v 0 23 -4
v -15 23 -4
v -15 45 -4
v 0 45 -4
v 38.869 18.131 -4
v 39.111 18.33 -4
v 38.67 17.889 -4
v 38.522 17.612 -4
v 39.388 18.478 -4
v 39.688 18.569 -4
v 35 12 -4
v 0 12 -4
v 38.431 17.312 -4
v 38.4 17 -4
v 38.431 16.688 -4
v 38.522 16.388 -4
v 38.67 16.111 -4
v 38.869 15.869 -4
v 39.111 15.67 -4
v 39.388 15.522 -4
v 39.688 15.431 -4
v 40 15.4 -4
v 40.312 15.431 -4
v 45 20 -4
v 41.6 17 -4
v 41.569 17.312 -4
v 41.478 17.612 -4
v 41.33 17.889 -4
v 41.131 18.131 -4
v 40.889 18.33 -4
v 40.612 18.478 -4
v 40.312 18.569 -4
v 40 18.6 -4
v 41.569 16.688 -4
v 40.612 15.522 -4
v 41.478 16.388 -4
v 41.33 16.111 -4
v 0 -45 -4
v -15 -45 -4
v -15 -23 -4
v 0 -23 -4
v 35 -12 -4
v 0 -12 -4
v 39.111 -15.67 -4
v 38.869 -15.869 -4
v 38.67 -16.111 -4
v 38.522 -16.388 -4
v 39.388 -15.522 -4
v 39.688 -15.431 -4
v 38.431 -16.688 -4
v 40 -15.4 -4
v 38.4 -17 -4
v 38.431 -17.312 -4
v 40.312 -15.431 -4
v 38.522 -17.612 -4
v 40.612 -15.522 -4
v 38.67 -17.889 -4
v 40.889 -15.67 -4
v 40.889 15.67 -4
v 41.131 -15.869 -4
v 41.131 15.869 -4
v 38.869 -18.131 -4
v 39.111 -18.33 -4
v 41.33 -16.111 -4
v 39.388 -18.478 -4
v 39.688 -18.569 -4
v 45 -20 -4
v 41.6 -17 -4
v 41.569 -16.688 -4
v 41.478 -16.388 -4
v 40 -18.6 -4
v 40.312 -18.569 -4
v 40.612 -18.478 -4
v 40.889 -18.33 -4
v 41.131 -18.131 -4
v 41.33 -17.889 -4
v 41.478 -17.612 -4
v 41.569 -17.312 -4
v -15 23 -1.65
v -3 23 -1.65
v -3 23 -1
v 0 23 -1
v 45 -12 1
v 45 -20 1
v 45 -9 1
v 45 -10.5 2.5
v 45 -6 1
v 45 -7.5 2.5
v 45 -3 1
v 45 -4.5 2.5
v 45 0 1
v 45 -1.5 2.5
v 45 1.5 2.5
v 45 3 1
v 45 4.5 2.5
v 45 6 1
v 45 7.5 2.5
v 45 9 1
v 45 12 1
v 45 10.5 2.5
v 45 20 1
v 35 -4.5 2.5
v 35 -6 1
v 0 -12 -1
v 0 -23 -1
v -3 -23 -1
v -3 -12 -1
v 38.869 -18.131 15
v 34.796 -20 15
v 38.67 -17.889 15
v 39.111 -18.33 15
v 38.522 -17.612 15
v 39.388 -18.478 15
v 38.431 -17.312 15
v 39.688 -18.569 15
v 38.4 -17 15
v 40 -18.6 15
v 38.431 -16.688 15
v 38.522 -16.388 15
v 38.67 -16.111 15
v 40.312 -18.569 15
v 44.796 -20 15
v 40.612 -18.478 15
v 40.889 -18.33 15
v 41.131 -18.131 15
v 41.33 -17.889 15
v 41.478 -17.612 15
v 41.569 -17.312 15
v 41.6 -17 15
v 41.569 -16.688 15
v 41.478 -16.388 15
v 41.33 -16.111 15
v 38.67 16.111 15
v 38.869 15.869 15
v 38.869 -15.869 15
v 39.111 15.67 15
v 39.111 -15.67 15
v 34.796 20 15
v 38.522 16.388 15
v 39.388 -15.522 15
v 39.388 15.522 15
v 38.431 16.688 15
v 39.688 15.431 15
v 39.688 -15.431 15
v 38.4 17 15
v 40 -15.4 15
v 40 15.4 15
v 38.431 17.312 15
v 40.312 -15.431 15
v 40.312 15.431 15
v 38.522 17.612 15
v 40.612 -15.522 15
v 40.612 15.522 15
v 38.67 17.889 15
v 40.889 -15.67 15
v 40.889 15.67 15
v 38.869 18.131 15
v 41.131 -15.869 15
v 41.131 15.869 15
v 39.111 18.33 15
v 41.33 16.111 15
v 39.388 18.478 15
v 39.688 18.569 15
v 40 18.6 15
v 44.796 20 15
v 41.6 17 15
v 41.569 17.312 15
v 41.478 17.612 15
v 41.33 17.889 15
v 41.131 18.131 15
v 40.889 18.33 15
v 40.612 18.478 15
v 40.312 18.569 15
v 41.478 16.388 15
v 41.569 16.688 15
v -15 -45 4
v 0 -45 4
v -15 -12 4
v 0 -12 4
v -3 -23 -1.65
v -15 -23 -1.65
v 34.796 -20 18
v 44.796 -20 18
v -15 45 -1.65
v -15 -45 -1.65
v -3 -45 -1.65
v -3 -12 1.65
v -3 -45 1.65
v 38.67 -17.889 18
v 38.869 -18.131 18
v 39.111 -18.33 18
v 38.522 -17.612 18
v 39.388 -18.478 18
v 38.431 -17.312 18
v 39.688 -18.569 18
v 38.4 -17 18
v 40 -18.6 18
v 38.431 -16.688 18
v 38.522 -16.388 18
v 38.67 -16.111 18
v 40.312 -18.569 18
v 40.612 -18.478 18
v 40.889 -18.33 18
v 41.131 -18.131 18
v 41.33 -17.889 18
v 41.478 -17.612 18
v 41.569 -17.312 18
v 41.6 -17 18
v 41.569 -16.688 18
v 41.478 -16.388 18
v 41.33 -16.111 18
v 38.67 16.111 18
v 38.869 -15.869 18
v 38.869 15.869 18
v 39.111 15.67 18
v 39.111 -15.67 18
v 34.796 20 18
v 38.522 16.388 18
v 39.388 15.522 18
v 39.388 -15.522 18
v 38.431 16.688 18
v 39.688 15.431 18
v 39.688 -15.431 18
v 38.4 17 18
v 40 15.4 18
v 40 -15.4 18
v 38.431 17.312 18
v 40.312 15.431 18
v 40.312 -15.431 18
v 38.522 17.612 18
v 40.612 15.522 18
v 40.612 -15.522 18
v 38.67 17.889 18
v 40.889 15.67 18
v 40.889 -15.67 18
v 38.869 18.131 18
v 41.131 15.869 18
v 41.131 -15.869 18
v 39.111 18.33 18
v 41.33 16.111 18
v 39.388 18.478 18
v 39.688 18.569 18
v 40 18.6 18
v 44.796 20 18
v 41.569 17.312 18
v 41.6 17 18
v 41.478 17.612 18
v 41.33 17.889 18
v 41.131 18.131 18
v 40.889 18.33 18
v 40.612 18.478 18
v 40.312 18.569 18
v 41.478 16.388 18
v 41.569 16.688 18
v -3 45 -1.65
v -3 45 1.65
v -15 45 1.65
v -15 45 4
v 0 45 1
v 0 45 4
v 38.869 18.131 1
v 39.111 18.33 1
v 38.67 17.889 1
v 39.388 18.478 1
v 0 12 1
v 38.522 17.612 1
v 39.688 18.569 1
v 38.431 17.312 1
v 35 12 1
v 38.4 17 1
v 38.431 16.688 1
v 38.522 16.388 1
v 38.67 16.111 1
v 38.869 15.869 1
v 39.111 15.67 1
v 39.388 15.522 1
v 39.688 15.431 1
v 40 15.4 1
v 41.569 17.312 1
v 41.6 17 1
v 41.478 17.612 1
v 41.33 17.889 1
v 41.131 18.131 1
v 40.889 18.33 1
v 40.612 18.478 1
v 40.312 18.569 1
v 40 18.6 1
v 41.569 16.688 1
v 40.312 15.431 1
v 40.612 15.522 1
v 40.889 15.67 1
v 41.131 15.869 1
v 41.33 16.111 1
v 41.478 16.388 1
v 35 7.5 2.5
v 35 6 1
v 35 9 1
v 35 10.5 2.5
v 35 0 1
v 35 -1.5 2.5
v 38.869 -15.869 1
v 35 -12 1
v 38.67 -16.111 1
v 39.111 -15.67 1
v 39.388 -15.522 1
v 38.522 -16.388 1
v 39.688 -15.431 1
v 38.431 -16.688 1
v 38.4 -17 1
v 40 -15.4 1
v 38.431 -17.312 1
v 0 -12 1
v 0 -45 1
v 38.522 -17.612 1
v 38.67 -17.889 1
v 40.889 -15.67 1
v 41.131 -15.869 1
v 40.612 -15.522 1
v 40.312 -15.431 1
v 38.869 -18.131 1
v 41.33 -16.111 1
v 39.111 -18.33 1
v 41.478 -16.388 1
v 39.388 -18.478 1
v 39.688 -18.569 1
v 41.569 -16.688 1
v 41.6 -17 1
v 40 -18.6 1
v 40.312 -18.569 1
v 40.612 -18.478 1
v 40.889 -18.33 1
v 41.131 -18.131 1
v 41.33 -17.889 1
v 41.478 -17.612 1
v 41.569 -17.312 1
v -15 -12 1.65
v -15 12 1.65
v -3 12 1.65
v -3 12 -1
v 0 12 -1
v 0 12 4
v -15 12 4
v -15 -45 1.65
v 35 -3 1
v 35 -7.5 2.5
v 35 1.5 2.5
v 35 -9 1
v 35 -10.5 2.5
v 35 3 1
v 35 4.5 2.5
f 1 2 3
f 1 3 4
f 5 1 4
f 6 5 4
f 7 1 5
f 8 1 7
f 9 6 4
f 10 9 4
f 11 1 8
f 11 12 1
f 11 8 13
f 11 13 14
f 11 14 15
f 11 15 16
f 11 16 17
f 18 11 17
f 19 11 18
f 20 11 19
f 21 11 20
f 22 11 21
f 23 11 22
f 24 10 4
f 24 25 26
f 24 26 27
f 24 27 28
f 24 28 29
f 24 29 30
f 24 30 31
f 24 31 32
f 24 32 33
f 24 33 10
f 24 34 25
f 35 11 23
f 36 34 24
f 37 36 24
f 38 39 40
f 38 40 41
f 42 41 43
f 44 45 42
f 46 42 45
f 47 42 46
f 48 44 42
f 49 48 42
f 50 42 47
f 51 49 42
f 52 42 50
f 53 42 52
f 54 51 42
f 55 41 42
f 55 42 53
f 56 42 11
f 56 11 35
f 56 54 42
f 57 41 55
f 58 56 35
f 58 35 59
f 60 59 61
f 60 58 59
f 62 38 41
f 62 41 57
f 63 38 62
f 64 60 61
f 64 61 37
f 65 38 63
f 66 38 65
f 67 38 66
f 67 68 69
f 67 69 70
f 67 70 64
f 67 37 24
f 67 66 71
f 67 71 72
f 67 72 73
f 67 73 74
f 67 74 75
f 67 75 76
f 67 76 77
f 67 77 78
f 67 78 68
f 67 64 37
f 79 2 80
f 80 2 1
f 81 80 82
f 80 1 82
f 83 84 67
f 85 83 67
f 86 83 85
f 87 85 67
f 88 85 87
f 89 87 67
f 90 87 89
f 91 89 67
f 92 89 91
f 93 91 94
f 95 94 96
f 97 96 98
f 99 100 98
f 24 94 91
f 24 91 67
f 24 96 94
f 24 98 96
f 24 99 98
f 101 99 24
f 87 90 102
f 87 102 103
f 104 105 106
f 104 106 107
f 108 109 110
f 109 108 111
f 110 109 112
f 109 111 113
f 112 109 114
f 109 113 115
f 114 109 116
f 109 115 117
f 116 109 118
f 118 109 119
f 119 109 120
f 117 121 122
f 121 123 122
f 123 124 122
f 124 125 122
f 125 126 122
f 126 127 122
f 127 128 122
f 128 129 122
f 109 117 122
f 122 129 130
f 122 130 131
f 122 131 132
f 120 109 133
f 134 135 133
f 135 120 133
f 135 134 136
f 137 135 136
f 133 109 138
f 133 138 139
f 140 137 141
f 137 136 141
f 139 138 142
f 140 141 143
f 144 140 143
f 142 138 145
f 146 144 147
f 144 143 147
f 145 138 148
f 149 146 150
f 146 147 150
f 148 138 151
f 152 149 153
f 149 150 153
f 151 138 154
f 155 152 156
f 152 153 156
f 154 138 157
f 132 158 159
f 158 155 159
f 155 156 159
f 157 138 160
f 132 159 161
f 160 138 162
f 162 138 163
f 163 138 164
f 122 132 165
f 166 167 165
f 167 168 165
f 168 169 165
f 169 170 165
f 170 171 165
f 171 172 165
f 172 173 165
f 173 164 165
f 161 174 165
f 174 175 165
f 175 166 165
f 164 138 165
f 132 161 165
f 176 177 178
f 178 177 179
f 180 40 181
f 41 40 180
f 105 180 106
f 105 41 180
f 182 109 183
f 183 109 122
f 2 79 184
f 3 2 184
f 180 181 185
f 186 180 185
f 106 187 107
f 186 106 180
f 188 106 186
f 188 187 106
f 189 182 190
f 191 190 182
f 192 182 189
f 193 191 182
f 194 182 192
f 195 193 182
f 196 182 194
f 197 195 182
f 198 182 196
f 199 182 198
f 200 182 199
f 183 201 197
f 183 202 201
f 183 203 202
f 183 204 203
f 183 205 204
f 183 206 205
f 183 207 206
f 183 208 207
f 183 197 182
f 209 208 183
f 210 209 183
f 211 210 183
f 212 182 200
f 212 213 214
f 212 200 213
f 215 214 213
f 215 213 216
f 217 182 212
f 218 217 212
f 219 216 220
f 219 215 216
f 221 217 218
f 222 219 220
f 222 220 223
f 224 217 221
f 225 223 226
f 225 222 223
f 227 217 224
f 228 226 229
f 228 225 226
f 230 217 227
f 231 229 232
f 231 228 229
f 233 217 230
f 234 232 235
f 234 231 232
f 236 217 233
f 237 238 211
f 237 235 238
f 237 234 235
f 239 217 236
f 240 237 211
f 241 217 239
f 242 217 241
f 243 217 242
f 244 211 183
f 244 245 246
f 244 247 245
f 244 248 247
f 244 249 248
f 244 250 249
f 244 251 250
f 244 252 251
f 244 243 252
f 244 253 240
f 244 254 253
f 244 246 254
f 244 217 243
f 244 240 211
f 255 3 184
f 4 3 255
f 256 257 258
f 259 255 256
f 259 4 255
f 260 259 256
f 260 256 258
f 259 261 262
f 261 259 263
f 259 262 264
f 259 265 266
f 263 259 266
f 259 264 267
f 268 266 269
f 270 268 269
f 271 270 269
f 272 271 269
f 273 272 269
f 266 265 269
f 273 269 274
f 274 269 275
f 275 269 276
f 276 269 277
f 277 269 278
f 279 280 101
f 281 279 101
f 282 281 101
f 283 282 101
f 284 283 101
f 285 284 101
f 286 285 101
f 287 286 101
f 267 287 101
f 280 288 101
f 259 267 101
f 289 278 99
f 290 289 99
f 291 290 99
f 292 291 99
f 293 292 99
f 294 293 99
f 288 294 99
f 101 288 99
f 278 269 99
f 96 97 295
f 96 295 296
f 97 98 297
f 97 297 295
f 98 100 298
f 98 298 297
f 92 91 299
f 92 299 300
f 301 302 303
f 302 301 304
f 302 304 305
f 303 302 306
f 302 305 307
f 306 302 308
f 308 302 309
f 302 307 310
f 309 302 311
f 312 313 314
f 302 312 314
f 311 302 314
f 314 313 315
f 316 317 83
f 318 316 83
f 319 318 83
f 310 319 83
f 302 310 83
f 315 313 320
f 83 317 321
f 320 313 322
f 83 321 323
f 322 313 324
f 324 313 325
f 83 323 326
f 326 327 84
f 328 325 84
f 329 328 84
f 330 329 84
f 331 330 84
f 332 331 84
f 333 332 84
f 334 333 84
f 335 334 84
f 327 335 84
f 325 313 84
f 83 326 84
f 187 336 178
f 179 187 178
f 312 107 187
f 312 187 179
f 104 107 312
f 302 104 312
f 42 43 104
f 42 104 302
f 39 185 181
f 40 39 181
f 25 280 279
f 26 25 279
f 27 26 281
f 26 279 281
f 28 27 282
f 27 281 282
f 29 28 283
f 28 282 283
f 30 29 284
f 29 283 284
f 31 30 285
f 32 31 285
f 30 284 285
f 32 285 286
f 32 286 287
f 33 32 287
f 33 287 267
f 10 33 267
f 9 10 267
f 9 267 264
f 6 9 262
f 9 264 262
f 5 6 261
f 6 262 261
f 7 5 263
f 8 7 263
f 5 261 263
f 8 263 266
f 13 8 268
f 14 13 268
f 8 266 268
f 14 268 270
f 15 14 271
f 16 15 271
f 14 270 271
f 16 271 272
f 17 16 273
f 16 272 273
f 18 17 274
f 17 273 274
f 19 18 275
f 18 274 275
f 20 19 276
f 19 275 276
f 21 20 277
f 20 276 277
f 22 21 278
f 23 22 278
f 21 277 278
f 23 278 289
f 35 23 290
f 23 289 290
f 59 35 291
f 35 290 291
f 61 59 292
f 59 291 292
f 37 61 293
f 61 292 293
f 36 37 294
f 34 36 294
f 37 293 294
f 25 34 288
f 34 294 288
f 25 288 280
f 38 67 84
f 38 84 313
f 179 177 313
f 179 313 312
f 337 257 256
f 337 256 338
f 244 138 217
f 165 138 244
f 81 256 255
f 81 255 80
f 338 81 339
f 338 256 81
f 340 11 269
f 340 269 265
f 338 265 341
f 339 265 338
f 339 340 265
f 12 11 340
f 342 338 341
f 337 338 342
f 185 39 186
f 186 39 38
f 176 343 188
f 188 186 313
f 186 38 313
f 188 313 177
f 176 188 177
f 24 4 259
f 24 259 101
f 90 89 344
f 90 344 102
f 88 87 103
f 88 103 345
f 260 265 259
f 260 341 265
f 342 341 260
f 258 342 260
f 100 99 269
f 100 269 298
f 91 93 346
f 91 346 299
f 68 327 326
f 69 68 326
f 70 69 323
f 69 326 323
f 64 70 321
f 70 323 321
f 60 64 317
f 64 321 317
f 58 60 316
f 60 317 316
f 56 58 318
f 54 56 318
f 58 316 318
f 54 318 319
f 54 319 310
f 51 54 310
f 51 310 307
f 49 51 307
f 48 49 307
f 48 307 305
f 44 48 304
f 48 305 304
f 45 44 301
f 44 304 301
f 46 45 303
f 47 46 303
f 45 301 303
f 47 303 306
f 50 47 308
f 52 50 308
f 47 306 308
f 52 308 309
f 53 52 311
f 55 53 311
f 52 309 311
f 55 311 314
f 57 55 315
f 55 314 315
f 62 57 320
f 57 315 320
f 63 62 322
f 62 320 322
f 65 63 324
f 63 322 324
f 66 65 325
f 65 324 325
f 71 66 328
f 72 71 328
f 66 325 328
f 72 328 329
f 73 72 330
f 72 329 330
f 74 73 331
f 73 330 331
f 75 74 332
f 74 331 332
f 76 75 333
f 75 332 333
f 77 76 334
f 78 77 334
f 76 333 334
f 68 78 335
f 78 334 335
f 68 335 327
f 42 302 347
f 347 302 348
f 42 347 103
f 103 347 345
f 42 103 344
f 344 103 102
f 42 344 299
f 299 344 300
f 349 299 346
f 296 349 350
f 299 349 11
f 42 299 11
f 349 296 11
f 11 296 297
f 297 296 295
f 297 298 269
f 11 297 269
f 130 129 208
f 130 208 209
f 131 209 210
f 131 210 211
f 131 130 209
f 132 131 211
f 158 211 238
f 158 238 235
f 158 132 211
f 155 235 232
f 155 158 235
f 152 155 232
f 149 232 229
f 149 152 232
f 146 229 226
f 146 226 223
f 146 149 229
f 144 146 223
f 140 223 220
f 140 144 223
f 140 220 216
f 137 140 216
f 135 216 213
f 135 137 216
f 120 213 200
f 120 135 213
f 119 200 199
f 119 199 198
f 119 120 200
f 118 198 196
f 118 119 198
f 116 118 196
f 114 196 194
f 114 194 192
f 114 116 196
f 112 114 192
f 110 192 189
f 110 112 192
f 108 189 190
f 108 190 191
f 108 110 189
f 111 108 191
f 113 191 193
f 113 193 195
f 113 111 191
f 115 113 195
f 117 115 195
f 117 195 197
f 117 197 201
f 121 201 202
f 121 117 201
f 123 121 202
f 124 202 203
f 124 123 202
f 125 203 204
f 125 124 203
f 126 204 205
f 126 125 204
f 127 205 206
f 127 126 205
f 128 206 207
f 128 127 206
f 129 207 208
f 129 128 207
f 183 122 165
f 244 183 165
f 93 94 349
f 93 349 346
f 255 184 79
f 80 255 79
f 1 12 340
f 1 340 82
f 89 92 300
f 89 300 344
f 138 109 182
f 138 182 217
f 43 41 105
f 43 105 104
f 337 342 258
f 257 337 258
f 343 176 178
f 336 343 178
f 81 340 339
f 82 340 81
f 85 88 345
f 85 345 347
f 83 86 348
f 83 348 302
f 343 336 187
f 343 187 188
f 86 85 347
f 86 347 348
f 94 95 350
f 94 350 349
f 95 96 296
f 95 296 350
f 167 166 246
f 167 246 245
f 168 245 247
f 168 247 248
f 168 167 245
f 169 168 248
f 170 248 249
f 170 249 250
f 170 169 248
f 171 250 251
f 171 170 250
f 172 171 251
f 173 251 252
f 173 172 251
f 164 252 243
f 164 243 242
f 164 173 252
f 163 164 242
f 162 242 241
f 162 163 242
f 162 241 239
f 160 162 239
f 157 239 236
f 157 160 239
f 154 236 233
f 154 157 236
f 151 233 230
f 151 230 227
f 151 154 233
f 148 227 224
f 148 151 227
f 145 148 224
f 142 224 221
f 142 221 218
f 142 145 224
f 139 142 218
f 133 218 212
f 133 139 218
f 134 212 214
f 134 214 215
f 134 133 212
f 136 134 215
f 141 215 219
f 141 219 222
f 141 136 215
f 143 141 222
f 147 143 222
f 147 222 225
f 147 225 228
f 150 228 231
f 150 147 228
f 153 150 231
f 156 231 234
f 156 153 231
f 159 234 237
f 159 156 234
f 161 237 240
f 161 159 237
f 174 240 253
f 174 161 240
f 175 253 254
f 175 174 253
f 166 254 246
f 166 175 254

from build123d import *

# Parameters (mm, degrees)
F0_W      = 90
F0_H      = 8
F1_DEPTH  = 15
F2_W      = 90
F2_H      = 3.3
F3_DEPTH  = 12
F4_W      = 24
F4_H      = 5
F5_DEPTH  = 15
F6_W      = 46
F6_H      = 3
F7_DEPTH  = 18
F8_W      = 24
F8_H      = 6
F9_DEPTH  = 15
F11_DEPTH = 5
F12_R     = 1.6
F13_DEPTH = 5
F15_DEPTH = 10
F17_W     = 10
F17_H     = 40
F17_R     = 1.6
F18_DEPTH = 3


with BuildPart() as f1:
    # F0 (on Right) → F1 (new body)
    with BuildSketch(Plane.YZ):
        Rectangle(F0_W, F0_H)
    extrude(amount=-F1_DEPTH)

    # F2 (on face) → F3 (cut)
    with BuildSketch(Plane(origin=(-15, 0, 0), x_dir=(0, -1, 0), z_dir=(-1, 0, 0))):
        Rectangle(F2_W, F2_H)
    extrude(amount=-F3_DEPTH, mode=Mode.SUBTRACT)

    # F4 (on face) → F5 (cut)
    with BuildSketch(Plane.YZ):
        with Locations((0, 1.5)):
            Rectangle(F4_W, F4_H)
    extrude(amount=-F5_DEPTH, mode=Mode.SUBTRACT)

    # F6 (on face) → F7 (cut)
    with BuildSketch(Plane.YZ):
        with Locations((0, -2.5)):
            Rectangle(F6_W, F6_H)
    extrude(amount=-F7_DEPTH, mode=Mode.SUBTRACT)

    # F8 (on face) → F9 (cut)
    with BuildSketch(Plane.YZ):
        with Locations((0, -1)):
            Rectangle(F8_W, F8_H)
    extrude(amount=-F9_DEPTH, mode=Mode.SUBTRACT)

    # F10 (on face) → F11 (join)
    with BuildSketch(Plane(origin=(0, 0, -4), x_dir=(1, 0, 0), z_dir=(0, 0, -1))):
        Polygon((45, 20), (0, 45), (0, 12), (35, 12), (35, 0), (45, 0), align=None)
        Polygon((45, -20), (45, 0), (35, 0), (35, -12), (0, -12), (0, -45), align=None)
    extrude(amount=-F11_DEPTH)

    # F12 (on face) → F13 (cut)
    with BuildSketch(Plane.XY.offset(1)):
        with Locations((40, 17)):
            Circle(F12_R)
        with Locations((40, -17)):
            Circle(F12_R)
    extrude(amount=-F13_DEPTH, mode=Mode.SUBTRACT)

    # F14 (on face) → F15 (join)
    with BuildSketch(Plane.YZ.offset(45)):
        Polygon((10.5, 2.5), (9, 1), (12, 1), align=None)
        Polygon((7.5, 2.5), (6, 1), (9, 1), align=None)
        Polygon((4.5, 2.5), (3, 1), (6, 1), align=None)
        Polygon((1.5, 2.5), (0, 1), (3, 1), align=None)
        Polygon((-12, 1), (-9, 1), (-10.5, 2.5), align=None)
        Polygon((-9, 1), (-6, 1), (-7.5, 2.5), align=None)
        Polygon((-6, 1), (-3, 1), (-4.5, 2.5), align=None)
        Polygon((-3, 1), (0, 1), (-1.5, 2.5), align=None)
    extrude(amount=-F15_DEPTH)


with BuildPart() as f18:
    # F17 (on offset) → F18 (new body)
    with BuildSketch(Plane.XY.offset(15)):
        with Locations((39.796235, 0)):
            Rectangle(F17_W, F17_H)
        with Locations((40, -17)):
            Circle(F17_R, mode=Mode.SUBTRACT)
        with Locations((40, 17)):
            Circle(F17_R, mode=Mode.SUBTRACT)
    extrude(amount=F18_DEPTH)


solid = Compound([f1.part, f18.part])
